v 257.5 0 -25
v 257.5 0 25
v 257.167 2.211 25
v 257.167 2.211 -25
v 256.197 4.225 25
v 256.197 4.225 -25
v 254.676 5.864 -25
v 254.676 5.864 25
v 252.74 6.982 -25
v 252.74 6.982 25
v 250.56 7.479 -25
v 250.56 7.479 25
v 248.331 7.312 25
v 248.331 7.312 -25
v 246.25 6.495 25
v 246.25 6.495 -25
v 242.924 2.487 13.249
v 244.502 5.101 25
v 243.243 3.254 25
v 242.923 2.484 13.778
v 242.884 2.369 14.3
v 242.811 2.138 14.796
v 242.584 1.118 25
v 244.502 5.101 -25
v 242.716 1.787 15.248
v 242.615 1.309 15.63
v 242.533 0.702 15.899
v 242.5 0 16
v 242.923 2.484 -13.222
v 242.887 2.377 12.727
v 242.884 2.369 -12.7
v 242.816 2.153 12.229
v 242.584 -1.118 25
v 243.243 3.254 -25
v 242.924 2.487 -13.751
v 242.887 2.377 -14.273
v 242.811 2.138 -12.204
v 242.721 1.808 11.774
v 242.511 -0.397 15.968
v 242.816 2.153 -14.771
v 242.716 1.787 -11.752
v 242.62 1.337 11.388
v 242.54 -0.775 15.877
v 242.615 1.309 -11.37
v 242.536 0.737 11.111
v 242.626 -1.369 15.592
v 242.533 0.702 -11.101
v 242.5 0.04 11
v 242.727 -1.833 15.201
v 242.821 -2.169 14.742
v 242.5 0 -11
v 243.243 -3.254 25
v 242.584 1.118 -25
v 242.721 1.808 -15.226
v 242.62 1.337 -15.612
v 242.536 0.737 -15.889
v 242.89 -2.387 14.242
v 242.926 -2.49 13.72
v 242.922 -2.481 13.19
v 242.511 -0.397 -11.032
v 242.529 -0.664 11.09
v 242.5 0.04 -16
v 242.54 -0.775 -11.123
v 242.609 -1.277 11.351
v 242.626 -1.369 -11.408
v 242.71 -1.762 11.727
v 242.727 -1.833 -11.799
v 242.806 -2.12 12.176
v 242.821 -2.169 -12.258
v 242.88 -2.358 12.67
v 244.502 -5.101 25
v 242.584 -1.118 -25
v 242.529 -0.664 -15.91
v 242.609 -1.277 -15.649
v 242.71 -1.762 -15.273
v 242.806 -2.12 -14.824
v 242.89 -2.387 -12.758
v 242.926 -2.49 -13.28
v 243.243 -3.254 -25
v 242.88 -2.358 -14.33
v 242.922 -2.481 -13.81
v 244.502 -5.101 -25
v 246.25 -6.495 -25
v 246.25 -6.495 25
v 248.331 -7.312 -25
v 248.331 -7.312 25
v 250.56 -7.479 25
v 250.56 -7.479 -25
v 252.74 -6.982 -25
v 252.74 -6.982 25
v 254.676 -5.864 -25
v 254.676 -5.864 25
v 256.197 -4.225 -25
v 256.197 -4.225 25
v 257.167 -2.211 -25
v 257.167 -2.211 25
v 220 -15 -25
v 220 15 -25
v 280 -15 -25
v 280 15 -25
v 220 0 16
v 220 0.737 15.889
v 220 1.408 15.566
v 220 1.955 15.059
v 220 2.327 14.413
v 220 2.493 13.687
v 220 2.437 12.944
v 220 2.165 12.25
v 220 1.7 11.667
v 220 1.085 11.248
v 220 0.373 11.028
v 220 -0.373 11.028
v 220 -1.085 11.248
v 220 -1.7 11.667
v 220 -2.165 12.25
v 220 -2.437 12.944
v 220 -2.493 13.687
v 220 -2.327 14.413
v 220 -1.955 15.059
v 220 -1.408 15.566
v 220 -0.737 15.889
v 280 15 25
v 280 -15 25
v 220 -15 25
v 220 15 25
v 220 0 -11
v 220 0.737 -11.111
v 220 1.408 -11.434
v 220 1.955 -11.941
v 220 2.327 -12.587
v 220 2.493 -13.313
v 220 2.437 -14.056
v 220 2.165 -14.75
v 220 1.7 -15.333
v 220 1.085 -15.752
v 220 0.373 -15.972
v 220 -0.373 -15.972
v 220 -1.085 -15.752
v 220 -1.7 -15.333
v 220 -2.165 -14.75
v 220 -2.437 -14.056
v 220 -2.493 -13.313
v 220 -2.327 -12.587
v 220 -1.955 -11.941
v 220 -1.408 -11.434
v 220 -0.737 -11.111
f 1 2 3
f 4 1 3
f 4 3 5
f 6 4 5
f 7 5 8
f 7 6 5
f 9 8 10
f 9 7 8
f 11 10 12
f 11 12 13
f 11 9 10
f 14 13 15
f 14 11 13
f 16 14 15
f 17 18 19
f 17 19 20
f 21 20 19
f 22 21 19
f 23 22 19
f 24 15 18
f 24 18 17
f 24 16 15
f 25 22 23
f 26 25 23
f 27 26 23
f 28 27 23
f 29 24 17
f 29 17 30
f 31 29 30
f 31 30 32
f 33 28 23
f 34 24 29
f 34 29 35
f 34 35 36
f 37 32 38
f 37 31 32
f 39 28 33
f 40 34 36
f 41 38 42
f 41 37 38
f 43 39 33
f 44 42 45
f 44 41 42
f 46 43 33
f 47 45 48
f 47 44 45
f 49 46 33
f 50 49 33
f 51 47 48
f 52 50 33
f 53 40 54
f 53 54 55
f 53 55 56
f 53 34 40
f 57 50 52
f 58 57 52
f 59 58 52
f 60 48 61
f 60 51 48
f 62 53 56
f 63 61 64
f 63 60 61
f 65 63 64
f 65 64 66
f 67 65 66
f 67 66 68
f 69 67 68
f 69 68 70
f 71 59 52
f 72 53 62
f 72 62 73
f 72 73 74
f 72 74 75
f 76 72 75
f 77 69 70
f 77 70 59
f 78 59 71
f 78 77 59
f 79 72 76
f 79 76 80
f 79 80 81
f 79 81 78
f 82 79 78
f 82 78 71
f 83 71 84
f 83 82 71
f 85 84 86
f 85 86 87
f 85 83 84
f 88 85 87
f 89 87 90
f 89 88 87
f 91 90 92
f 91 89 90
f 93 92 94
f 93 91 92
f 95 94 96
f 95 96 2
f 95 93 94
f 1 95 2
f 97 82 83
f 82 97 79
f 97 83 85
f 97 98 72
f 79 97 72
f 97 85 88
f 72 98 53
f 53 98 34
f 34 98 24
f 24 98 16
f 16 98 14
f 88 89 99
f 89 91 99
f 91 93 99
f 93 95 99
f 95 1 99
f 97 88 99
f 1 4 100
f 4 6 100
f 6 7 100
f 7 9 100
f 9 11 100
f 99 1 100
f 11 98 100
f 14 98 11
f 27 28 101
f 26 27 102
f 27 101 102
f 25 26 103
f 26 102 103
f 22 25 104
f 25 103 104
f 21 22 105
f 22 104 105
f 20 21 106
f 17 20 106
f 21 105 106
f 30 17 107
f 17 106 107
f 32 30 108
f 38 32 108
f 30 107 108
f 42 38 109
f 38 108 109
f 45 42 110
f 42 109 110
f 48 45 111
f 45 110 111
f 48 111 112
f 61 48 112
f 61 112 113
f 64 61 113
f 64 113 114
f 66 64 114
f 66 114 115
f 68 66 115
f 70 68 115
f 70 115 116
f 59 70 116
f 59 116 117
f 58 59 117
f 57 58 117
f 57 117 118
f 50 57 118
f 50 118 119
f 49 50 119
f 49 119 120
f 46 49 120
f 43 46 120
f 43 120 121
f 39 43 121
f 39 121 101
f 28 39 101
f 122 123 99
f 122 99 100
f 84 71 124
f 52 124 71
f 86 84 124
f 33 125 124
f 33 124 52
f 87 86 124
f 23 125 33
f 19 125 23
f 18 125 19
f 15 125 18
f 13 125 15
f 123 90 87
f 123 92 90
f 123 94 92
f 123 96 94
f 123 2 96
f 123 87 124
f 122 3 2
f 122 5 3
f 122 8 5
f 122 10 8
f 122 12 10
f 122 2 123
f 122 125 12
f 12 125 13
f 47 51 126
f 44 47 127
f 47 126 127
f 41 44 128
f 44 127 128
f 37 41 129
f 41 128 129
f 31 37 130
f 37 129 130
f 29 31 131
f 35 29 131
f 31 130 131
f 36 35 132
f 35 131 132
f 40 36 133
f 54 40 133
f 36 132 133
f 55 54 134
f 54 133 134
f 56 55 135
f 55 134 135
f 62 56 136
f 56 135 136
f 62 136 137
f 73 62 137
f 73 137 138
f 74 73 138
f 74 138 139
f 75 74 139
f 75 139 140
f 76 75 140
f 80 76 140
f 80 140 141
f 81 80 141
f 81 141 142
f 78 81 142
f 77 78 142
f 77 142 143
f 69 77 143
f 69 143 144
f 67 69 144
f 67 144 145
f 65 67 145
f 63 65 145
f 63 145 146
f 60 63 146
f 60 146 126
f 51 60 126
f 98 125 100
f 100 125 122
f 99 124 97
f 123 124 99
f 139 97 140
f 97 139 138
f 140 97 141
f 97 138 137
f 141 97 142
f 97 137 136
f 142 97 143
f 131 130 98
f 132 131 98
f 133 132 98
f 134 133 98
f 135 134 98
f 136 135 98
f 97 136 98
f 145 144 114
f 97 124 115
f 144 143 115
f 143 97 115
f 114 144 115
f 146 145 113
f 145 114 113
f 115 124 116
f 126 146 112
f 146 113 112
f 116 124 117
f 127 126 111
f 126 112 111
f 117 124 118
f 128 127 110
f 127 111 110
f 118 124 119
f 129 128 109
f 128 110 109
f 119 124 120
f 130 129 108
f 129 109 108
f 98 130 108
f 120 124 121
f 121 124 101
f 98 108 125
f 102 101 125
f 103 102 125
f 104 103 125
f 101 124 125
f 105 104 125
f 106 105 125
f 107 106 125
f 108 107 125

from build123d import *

# Parameters (mm, degrees)
SKETCH1_W           = 60
SKETCH1_H           = 30
SKETCH1_R           = 7.5
BOSS_EXTRUDE1_DEPTH = 25
SKETCH2_R           = 2.5
CUT_EXTRUDE1_DEPTH  = 30


with BuildPart() as part:
    # Sketch1 → Boss-Extrude1 (new body, symmetric)
    with BuildSketch(Plane.XY):
        with Locations((250, 0)):
            Rectangle(SKETCH1_W, SKETCH1_H)
        with Locations((250, 0)):
            Circle(SKETCH1_R, mode=Mode.SUBTRACT)
    extrude(amount=BOSS_EXTRUDE1_DEPTH, both=True)

    # Sketch2 → Cut-Extrude1 (cut)
    with BuildSketch(Plane.ZY.offset(-220)):
        with Locations((13.5, 0)):
            Circle(SKETCH2_R)
        with Locations((-13.5, 0)):
            Circle(SKETCH2_R)
    extrude(amount=-CUT_EXTRUDE1_DEPTH, mode=Mode.SUBTRACT)


solid = part.part
